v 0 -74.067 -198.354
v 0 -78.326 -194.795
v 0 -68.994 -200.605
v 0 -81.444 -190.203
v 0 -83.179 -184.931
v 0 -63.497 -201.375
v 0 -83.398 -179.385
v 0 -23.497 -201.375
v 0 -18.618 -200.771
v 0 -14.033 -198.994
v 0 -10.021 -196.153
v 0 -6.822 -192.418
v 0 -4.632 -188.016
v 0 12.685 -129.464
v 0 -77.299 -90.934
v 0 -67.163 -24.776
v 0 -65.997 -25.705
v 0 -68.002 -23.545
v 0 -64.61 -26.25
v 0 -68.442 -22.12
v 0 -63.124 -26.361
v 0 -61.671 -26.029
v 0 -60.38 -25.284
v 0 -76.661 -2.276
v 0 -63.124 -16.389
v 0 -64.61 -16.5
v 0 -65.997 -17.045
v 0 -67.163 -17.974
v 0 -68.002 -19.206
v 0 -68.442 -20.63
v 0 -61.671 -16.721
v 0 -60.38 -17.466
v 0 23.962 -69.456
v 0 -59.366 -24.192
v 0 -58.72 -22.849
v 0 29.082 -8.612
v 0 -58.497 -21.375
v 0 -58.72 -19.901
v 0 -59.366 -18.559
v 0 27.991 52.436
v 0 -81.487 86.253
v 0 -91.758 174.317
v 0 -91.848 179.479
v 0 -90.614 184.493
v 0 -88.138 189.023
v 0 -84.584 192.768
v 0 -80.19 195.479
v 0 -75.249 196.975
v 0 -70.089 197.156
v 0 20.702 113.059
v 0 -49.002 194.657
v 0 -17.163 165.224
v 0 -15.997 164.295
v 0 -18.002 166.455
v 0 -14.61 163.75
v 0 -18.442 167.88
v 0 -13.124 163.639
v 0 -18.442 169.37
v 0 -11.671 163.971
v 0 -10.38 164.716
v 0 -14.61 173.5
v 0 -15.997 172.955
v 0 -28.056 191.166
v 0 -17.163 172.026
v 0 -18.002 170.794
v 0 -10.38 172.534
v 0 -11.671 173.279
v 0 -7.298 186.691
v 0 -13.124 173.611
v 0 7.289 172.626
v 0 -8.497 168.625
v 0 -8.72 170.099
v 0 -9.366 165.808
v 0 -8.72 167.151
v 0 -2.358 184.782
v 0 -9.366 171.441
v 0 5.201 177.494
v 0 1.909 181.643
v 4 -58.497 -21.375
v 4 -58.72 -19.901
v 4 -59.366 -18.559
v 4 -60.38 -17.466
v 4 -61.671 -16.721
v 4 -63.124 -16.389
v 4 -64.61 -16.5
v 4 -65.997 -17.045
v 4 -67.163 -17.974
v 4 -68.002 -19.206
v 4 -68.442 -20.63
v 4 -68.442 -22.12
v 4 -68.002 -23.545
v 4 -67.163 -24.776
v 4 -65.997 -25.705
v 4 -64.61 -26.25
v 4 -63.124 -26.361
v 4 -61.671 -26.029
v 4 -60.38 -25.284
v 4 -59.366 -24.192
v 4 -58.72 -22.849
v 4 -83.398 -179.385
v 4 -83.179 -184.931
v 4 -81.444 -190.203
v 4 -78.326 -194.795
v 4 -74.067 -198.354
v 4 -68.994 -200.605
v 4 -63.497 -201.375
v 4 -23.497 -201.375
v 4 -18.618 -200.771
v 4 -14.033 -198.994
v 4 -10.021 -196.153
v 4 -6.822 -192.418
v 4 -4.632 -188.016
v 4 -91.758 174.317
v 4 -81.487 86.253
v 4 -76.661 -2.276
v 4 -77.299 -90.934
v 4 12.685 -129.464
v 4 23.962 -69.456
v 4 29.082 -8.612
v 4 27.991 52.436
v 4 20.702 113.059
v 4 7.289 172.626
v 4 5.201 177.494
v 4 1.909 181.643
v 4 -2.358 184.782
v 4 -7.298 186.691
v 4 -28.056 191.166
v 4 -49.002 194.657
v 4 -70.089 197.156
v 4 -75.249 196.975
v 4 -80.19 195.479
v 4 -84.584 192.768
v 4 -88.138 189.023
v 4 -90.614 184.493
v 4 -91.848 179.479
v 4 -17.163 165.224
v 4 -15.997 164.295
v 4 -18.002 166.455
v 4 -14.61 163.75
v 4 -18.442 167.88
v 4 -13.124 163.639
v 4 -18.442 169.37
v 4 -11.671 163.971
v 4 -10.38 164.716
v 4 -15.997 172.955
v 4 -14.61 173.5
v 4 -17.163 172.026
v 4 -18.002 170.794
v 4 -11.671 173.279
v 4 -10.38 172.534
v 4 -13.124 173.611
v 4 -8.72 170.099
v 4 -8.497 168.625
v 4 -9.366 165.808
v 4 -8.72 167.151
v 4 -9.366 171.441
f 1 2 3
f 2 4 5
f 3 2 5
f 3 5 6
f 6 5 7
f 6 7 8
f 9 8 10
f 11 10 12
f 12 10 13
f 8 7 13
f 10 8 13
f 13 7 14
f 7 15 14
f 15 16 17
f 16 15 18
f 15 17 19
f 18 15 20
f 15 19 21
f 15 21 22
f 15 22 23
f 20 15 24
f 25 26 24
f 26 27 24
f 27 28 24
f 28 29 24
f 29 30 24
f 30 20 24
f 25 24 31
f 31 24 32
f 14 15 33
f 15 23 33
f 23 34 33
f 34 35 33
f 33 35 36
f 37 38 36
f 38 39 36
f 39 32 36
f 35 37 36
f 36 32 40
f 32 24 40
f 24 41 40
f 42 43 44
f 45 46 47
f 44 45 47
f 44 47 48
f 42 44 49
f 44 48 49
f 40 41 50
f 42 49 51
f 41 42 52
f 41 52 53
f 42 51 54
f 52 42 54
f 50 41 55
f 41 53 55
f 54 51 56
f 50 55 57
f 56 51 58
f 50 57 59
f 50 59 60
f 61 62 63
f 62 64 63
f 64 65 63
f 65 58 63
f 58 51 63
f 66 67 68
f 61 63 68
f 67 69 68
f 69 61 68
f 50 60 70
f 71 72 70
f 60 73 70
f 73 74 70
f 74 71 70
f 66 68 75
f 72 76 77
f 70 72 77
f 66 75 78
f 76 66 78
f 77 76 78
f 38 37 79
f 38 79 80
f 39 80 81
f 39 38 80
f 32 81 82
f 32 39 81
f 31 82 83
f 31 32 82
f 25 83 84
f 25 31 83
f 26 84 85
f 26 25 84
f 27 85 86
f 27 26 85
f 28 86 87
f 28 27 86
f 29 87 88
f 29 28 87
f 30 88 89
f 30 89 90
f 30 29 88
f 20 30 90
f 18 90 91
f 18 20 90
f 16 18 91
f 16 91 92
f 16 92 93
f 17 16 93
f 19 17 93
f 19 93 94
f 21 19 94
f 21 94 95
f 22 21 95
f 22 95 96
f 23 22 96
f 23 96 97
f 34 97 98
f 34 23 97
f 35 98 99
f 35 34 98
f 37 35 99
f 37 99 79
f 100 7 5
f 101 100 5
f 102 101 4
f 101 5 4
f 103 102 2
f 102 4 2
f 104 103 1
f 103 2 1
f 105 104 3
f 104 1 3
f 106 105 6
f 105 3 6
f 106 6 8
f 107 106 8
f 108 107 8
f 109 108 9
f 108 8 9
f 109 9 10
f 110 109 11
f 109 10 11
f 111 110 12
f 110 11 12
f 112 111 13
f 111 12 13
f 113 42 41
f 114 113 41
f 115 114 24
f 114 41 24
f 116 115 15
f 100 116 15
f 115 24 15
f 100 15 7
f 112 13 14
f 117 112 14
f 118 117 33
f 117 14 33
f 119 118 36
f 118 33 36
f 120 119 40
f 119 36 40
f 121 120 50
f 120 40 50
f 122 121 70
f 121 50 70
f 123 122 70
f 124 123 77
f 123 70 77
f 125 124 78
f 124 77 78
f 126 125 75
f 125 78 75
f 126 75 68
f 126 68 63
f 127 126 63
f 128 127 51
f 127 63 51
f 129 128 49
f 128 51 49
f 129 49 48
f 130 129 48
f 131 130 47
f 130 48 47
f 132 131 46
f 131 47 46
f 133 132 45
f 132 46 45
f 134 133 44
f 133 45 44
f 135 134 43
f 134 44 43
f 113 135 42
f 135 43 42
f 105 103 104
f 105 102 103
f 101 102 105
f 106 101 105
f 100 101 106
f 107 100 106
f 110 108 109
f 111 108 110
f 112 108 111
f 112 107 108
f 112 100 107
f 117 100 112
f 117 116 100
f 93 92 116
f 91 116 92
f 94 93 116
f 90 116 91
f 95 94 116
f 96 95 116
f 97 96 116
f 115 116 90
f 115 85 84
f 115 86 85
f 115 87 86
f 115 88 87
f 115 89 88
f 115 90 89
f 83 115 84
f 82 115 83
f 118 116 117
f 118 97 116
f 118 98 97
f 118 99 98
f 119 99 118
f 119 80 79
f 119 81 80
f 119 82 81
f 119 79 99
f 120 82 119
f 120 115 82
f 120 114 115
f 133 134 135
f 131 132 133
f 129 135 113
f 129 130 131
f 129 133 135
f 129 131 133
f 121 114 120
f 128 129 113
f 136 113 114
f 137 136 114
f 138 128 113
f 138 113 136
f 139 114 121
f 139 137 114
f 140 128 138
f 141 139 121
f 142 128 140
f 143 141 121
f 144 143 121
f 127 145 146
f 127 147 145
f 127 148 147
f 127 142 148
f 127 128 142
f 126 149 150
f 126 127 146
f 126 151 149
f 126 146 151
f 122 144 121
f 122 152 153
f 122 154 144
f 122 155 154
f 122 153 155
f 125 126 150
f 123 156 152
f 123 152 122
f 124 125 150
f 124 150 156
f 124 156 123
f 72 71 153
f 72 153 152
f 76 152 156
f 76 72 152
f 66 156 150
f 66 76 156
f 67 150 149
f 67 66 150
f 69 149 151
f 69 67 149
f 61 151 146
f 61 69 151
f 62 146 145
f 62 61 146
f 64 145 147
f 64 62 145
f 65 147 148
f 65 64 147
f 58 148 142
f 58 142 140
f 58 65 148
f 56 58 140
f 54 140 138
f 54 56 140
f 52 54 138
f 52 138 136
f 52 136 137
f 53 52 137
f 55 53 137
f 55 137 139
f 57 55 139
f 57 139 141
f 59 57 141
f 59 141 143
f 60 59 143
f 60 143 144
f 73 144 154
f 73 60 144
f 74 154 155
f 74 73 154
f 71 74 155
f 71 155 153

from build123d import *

# Parameters (mm, degrees)
F0_W     = 130
F0_H     = 400
F0_R     = 5
F1_DEPTH = 4
F3_DEPTH = 5


with BuildPart() as f1:
    # F0 (on Right) → F1 (new body)
    with BuildSketch(Plane.YZ):
        with Locations((-28.497371, -1.37512)):
            Rectangle(F0_W, F0_H)
        with Locations((-63.497371, -21.37512)):
            Circle(F0_R, mode=Mode.SUBTRACT)
        with Locations((-13.497371, 168.62488)):
            Circle(F0_R, mode=Mode.SUBTRACT)
    extrude(amount=F1_DEPTH)

    # F2 (on face) → F3 (intersect)
    with BuildSketch(Plane.YZ):
        with BuildLine():
            ThreePointArc((-91.758037, 174.317055), (-76.660595, -2.275866), (-83.398097, -179.384868))
            ThreePointArc((-83.398097, -179.384868), (-78.326482, -194.79516), (-63.497371, -201.37512))
            Line((-63.497371, -201.37512), (-23.497371, -201.37512))
            ThreePointArc((-23.497371, -201.37512), (-11.939199, -197.69715), (-4.632088, -188.015985))
            ThreePointArc((-4.632088, -188.015985), (29.081884, -8.612485), (7.289094, 172.625817))
            ThreePointArc((7.289094, 172.625817), (1.908539, 181.642764), (-7.298468, 186.691201))
            ThreePointArc((-7.298468, 186.691201), (-38.508536, 193.035445), (-70.089166, 197.156317))
            ThreePointArc((-70.089166, 197.156317), (-86.482566, 191.010783), (-91.758037, 174.317055))
        make_face()
    extrude(amount=F3_DEPTH, mode=Mode.INTERSECT)


solid = f1.part
